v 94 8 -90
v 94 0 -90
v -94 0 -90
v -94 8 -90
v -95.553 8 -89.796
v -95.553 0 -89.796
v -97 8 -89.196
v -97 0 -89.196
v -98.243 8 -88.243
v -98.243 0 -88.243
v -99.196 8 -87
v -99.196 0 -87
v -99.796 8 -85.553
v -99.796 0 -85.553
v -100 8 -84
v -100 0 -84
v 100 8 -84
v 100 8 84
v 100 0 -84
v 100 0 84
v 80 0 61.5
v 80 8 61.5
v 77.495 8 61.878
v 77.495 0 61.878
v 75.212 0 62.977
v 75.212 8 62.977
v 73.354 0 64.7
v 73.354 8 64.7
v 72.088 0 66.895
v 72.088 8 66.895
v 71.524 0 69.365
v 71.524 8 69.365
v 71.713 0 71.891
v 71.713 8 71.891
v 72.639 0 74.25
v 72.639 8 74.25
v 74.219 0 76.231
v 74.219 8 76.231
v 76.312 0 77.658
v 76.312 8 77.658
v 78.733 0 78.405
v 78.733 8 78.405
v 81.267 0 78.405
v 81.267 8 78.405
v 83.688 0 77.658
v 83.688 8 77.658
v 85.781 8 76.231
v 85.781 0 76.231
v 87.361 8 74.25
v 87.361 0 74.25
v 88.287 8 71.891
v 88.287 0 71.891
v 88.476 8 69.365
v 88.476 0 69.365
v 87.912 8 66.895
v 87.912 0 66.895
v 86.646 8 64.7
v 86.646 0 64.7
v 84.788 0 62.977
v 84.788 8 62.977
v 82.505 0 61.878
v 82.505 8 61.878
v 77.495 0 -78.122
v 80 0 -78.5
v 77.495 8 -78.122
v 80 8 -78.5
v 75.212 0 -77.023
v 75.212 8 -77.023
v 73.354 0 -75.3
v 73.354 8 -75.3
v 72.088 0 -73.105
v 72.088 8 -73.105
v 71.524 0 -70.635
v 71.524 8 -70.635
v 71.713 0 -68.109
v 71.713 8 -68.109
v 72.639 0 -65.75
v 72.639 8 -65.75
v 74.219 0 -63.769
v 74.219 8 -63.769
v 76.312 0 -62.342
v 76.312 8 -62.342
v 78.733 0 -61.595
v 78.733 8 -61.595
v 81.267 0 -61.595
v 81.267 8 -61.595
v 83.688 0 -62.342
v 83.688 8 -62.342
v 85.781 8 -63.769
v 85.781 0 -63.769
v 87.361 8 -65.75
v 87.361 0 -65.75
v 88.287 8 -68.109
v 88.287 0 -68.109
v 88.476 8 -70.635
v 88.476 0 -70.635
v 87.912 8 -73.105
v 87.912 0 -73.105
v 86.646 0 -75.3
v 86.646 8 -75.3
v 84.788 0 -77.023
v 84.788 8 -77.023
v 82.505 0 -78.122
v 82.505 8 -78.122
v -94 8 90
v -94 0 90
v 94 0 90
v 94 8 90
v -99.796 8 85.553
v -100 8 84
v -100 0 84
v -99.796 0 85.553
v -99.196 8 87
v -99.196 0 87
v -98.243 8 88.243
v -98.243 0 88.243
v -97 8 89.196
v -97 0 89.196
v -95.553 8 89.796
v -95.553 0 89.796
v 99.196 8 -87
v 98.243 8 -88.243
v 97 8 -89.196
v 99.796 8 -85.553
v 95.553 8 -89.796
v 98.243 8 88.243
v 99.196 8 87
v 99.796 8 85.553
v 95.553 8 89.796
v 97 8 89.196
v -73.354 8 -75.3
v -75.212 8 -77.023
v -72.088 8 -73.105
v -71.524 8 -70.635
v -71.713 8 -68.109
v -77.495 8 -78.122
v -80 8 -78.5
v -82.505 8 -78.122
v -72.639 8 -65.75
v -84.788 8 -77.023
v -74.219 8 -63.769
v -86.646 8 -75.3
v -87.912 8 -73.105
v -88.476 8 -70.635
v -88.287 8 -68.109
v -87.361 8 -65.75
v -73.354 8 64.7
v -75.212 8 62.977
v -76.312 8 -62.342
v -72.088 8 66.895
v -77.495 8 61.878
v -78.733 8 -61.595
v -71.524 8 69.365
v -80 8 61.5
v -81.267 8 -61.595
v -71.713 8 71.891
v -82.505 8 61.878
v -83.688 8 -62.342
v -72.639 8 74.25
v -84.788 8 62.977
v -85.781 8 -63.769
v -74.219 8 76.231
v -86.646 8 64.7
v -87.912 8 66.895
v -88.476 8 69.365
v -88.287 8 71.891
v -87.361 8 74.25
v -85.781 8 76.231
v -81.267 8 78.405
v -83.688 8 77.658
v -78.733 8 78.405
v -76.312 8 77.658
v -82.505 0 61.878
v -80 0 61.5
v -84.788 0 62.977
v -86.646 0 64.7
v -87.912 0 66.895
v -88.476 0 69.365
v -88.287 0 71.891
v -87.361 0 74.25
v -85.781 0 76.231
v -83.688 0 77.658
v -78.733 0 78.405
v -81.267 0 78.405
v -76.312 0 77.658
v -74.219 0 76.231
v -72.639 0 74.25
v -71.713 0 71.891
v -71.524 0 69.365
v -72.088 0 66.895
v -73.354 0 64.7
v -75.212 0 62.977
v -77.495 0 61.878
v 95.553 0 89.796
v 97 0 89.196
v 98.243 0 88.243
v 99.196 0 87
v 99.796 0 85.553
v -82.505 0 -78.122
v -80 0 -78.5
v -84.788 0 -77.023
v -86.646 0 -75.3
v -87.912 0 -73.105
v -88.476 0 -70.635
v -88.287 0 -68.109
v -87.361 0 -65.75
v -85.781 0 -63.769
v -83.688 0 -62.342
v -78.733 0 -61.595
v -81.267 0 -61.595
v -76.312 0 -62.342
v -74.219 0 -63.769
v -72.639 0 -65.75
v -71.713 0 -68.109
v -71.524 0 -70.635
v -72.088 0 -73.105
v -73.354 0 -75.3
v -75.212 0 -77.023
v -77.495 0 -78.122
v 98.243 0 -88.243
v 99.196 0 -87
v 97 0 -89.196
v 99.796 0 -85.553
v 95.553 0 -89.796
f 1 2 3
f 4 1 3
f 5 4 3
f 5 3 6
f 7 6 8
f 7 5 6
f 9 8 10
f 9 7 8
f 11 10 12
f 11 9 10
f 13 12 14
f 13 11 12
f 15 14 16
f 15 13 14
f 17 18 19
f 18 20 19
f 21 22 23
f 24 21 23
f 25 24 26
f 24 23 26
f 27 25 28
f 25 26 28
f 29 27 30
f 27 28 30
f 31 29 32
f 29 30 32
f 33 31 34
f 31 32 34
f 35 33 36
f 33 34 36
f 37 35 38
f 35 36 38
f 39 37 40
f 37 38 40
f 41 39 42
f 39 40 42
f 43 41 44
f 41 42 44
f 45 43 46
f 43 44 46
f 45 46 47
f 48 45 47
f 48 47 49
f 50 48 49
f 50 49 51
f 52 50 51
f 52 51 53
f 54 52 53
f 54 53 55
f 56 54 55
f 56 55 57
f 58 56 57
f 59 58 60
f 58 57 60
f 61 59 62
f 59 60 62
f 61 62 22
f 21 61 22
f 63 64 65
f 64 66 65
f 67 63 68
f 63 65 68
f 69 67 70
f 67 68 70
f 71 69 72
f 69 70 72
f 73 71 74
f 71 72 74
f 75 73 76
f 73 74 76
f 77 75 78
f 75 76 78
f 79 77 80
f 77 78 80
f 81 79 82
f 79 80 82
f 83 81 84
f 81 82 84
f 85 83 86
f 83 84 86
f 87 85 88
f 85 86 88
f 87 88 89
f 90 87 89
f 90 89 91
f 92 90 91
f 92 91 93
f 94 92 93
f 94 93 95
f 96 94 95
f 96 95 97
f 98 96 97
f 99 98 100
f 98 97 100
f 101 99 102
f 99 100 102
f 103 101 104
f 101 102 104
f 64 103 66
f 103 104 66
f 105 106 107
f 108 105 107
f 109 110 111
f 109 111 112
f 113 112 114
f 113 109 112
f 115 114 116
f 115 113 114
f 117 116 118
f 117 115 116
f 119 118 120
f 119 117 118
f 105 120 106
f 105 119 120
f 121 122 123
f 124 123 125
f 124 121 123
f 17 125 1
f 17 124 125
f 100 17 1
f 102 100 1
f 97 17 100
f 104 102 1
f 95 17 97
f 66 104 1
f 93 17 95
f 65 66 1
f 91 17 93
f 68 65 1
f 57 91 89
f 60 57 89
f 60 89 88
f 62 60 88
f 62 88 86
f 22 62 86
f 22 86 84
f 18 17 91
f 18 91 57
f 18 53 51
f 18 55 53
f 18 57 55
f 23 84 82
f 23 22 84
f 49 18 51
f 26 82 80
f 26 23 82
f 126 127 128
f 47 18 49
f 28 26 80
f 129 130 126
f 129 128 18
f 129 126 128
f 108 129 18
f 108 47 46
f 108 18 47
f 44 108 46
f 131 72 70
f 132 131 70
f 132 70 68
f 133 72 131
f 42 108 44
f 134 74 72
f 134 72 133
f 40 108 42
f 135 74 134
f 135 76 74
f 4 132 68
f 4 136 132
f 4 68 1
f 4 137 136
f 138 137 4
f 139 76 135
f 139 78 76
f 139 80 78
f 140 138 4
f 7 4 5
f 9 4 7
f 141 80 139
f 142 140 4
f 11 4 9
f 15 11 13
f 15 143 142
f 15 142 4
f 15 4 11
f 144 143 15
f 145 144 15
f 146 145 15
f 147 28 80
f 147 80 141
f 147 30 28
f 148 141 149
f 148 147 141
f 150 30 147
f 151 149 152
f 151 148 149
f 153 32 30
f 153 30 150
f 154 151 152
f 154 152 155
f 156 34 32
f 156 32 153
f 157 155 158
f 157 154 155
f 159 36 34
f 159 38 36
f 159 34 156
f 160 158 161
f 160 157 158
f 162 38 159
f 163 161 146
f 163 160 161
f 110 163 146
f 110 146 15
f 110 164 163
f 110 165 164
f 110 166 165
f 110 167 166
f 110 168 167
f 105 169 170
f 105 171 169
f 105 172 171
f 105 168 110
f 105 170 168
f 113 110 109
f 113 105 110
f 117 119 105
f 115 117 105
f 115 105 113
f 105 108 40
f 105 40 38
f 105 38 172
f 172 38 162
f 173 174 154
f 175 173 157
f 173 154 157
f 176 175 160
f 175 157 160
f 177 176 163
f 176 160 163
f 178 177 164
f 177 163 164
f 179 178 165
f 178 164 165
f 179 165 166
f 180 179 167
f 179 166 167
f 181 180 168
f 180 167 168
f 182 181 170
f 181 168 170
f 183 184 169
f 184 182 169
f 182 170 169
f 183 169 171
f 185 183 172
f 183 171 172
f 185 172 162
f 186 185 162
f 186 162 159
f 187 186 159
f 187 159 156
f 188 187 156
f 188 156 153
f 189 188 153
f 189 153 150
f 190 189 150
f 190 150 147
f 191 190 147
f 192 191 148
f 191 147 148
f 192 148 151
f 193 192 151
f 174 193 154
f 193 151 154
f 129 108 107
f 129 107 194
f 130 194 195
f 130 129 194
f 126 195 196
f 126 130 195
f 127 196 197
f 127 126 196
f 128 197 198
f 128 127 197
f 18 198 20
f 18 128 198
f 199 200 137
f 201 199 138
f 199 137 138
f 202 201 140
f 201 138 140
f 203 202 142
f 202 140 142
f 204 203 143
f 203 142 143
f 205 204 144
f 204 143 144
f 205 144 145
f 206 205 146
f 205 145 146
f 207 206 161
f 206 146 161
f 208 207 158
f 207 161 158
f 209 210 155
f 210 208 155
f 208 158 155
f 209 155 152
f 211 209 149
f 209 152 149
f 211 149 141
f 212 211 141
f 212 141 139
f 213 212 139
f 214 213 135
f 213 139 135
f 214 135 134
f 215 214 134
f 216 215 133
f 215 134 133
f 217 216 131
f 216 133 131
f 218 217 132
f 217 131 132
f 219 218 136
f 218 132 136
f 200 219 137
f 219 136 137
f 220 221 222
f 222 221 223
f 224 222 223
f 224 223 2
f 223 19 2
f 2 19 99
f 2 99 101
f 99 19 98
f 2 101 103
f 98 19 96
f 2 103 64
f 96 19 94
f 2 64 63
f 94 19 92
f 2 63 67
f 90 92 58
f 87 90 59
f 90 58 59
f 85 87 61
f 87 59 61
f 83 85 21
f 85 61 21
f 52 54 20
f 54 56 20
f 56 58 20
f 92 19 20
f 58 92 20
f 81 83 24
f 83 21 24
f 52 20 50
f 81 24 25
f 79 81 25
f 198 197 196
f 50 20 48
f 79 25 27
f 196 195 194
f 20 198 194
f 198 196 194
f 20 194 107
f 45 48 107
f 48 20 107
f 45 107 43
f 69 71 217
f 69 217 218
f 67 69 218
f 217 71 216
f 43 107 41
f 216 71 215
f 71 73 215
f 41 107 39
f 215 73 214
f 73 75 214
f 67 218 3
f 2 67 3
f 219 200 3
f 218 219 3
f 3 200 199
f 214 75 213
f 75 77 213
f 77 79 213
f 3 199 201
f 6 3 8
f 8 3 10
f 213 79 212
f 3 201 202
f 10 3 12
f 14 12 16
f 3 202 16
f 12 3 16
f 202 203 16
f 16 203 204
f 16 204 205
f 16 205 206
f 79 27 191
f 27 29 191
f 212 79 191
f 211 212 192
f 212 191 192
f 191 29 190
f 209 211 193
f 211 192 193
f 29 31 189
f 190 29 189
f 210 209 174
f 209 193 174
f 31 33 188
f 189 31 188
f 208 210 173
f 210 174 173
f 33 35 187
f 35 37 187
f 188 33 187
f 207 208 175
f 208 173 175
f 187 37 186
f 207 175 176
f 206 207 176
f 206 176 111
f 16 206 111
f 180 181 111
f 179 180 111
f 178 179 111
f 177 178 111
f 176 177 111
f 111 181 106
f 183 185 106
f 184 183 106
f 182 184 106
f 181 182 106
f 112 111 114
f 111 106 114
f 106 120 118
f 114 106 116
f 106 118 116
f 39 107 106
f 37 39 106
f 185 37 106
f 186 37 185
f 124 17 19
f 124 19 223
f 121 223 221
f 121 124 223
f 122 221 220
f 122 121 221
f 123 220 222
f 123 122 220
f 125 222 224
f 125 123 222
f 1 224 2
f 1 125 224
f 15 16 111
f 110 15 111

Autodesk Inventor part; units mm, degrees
ref_plane "YZ Plane" through (0, 0, 0) normal (1, 0, 0) x (0, 1, 0)
ref_plane "XZ Plane" through (0, 0, 0) normal (0, 1, 0) x (-1, 0, 0)
ref_plane "XY Plane" through (0, 0, 0) normal (0, 0, 1) x (1, 0, 0)
sketch "Sketch1" plane through (0, 0, 0) normal (0, 1, 0) x (-1, 0, 0)
  line L0 (100, 90) -> (-100, 90)
  line L1 (-100, 90) -> (-100, -90)
  line L2 (-100, -90) -> (100, -90)
  line L3 (100, -90) -> (100, 90)
  point P0 (0, 0)
  point P1 (0, 90)
  point P2 (100, 0)
  dimension "d0" = 200
  dimension "d1" = 180
extrude "Plate1" add sketch "Sketch1" along normal blind 8
sketch "Sketch2" plane through (0, 0, 0) normal (0, -1, 0) x (1, 0, 0)
  line L0 (80, 70) -> (80, -70) construction
  line L1 (-100, -90) -> (-100, 90) projected
  line L2 (100, 90) -> (100, -90) projected
  point P0 (0, 0)
  point P1 (80, 0)
  point P2 (-100, 0)
  dimension "d10" = 20
  dimension "d12" = 20
hole "Hole1" at (80, 0, 70) at (80, 0, -70) direction (0, 1, 0) diameter 17 end through all
fillet "Corner Round1" radius 6 4 edges at (100, 4, 90) (100, 4, -90) (-100, 4, -90) (-100, 4, 90)
mirror "Mirror1" about plane through (0, 0, 0) normal (1, 0, 0) of "Hole1"
equation "\"d12\" = d10"
equation "\"d8\" = Thickness"
equation "\"d2\" = Thickness"
equation "\"BendRadius\" = Thickness"
equation "\"BendReliefWidth\" = Thickness"
equation "\"BendReliefDepth\" = 0.5 * Thickness"
equation "\"CornerReliefSize\" = 4 * Thickness"
equation "\"MinimumRemnant\" = 2 * Thickness"
equation "\"TransitionRadius\" = BendRadius"
equation "\"JacobiRadiusSize\" = BendRadius"
equation "\"GapSize\" = Thickness"
equation "\"Thickness\" = 8"
properties part number "Сrane plate 6"
